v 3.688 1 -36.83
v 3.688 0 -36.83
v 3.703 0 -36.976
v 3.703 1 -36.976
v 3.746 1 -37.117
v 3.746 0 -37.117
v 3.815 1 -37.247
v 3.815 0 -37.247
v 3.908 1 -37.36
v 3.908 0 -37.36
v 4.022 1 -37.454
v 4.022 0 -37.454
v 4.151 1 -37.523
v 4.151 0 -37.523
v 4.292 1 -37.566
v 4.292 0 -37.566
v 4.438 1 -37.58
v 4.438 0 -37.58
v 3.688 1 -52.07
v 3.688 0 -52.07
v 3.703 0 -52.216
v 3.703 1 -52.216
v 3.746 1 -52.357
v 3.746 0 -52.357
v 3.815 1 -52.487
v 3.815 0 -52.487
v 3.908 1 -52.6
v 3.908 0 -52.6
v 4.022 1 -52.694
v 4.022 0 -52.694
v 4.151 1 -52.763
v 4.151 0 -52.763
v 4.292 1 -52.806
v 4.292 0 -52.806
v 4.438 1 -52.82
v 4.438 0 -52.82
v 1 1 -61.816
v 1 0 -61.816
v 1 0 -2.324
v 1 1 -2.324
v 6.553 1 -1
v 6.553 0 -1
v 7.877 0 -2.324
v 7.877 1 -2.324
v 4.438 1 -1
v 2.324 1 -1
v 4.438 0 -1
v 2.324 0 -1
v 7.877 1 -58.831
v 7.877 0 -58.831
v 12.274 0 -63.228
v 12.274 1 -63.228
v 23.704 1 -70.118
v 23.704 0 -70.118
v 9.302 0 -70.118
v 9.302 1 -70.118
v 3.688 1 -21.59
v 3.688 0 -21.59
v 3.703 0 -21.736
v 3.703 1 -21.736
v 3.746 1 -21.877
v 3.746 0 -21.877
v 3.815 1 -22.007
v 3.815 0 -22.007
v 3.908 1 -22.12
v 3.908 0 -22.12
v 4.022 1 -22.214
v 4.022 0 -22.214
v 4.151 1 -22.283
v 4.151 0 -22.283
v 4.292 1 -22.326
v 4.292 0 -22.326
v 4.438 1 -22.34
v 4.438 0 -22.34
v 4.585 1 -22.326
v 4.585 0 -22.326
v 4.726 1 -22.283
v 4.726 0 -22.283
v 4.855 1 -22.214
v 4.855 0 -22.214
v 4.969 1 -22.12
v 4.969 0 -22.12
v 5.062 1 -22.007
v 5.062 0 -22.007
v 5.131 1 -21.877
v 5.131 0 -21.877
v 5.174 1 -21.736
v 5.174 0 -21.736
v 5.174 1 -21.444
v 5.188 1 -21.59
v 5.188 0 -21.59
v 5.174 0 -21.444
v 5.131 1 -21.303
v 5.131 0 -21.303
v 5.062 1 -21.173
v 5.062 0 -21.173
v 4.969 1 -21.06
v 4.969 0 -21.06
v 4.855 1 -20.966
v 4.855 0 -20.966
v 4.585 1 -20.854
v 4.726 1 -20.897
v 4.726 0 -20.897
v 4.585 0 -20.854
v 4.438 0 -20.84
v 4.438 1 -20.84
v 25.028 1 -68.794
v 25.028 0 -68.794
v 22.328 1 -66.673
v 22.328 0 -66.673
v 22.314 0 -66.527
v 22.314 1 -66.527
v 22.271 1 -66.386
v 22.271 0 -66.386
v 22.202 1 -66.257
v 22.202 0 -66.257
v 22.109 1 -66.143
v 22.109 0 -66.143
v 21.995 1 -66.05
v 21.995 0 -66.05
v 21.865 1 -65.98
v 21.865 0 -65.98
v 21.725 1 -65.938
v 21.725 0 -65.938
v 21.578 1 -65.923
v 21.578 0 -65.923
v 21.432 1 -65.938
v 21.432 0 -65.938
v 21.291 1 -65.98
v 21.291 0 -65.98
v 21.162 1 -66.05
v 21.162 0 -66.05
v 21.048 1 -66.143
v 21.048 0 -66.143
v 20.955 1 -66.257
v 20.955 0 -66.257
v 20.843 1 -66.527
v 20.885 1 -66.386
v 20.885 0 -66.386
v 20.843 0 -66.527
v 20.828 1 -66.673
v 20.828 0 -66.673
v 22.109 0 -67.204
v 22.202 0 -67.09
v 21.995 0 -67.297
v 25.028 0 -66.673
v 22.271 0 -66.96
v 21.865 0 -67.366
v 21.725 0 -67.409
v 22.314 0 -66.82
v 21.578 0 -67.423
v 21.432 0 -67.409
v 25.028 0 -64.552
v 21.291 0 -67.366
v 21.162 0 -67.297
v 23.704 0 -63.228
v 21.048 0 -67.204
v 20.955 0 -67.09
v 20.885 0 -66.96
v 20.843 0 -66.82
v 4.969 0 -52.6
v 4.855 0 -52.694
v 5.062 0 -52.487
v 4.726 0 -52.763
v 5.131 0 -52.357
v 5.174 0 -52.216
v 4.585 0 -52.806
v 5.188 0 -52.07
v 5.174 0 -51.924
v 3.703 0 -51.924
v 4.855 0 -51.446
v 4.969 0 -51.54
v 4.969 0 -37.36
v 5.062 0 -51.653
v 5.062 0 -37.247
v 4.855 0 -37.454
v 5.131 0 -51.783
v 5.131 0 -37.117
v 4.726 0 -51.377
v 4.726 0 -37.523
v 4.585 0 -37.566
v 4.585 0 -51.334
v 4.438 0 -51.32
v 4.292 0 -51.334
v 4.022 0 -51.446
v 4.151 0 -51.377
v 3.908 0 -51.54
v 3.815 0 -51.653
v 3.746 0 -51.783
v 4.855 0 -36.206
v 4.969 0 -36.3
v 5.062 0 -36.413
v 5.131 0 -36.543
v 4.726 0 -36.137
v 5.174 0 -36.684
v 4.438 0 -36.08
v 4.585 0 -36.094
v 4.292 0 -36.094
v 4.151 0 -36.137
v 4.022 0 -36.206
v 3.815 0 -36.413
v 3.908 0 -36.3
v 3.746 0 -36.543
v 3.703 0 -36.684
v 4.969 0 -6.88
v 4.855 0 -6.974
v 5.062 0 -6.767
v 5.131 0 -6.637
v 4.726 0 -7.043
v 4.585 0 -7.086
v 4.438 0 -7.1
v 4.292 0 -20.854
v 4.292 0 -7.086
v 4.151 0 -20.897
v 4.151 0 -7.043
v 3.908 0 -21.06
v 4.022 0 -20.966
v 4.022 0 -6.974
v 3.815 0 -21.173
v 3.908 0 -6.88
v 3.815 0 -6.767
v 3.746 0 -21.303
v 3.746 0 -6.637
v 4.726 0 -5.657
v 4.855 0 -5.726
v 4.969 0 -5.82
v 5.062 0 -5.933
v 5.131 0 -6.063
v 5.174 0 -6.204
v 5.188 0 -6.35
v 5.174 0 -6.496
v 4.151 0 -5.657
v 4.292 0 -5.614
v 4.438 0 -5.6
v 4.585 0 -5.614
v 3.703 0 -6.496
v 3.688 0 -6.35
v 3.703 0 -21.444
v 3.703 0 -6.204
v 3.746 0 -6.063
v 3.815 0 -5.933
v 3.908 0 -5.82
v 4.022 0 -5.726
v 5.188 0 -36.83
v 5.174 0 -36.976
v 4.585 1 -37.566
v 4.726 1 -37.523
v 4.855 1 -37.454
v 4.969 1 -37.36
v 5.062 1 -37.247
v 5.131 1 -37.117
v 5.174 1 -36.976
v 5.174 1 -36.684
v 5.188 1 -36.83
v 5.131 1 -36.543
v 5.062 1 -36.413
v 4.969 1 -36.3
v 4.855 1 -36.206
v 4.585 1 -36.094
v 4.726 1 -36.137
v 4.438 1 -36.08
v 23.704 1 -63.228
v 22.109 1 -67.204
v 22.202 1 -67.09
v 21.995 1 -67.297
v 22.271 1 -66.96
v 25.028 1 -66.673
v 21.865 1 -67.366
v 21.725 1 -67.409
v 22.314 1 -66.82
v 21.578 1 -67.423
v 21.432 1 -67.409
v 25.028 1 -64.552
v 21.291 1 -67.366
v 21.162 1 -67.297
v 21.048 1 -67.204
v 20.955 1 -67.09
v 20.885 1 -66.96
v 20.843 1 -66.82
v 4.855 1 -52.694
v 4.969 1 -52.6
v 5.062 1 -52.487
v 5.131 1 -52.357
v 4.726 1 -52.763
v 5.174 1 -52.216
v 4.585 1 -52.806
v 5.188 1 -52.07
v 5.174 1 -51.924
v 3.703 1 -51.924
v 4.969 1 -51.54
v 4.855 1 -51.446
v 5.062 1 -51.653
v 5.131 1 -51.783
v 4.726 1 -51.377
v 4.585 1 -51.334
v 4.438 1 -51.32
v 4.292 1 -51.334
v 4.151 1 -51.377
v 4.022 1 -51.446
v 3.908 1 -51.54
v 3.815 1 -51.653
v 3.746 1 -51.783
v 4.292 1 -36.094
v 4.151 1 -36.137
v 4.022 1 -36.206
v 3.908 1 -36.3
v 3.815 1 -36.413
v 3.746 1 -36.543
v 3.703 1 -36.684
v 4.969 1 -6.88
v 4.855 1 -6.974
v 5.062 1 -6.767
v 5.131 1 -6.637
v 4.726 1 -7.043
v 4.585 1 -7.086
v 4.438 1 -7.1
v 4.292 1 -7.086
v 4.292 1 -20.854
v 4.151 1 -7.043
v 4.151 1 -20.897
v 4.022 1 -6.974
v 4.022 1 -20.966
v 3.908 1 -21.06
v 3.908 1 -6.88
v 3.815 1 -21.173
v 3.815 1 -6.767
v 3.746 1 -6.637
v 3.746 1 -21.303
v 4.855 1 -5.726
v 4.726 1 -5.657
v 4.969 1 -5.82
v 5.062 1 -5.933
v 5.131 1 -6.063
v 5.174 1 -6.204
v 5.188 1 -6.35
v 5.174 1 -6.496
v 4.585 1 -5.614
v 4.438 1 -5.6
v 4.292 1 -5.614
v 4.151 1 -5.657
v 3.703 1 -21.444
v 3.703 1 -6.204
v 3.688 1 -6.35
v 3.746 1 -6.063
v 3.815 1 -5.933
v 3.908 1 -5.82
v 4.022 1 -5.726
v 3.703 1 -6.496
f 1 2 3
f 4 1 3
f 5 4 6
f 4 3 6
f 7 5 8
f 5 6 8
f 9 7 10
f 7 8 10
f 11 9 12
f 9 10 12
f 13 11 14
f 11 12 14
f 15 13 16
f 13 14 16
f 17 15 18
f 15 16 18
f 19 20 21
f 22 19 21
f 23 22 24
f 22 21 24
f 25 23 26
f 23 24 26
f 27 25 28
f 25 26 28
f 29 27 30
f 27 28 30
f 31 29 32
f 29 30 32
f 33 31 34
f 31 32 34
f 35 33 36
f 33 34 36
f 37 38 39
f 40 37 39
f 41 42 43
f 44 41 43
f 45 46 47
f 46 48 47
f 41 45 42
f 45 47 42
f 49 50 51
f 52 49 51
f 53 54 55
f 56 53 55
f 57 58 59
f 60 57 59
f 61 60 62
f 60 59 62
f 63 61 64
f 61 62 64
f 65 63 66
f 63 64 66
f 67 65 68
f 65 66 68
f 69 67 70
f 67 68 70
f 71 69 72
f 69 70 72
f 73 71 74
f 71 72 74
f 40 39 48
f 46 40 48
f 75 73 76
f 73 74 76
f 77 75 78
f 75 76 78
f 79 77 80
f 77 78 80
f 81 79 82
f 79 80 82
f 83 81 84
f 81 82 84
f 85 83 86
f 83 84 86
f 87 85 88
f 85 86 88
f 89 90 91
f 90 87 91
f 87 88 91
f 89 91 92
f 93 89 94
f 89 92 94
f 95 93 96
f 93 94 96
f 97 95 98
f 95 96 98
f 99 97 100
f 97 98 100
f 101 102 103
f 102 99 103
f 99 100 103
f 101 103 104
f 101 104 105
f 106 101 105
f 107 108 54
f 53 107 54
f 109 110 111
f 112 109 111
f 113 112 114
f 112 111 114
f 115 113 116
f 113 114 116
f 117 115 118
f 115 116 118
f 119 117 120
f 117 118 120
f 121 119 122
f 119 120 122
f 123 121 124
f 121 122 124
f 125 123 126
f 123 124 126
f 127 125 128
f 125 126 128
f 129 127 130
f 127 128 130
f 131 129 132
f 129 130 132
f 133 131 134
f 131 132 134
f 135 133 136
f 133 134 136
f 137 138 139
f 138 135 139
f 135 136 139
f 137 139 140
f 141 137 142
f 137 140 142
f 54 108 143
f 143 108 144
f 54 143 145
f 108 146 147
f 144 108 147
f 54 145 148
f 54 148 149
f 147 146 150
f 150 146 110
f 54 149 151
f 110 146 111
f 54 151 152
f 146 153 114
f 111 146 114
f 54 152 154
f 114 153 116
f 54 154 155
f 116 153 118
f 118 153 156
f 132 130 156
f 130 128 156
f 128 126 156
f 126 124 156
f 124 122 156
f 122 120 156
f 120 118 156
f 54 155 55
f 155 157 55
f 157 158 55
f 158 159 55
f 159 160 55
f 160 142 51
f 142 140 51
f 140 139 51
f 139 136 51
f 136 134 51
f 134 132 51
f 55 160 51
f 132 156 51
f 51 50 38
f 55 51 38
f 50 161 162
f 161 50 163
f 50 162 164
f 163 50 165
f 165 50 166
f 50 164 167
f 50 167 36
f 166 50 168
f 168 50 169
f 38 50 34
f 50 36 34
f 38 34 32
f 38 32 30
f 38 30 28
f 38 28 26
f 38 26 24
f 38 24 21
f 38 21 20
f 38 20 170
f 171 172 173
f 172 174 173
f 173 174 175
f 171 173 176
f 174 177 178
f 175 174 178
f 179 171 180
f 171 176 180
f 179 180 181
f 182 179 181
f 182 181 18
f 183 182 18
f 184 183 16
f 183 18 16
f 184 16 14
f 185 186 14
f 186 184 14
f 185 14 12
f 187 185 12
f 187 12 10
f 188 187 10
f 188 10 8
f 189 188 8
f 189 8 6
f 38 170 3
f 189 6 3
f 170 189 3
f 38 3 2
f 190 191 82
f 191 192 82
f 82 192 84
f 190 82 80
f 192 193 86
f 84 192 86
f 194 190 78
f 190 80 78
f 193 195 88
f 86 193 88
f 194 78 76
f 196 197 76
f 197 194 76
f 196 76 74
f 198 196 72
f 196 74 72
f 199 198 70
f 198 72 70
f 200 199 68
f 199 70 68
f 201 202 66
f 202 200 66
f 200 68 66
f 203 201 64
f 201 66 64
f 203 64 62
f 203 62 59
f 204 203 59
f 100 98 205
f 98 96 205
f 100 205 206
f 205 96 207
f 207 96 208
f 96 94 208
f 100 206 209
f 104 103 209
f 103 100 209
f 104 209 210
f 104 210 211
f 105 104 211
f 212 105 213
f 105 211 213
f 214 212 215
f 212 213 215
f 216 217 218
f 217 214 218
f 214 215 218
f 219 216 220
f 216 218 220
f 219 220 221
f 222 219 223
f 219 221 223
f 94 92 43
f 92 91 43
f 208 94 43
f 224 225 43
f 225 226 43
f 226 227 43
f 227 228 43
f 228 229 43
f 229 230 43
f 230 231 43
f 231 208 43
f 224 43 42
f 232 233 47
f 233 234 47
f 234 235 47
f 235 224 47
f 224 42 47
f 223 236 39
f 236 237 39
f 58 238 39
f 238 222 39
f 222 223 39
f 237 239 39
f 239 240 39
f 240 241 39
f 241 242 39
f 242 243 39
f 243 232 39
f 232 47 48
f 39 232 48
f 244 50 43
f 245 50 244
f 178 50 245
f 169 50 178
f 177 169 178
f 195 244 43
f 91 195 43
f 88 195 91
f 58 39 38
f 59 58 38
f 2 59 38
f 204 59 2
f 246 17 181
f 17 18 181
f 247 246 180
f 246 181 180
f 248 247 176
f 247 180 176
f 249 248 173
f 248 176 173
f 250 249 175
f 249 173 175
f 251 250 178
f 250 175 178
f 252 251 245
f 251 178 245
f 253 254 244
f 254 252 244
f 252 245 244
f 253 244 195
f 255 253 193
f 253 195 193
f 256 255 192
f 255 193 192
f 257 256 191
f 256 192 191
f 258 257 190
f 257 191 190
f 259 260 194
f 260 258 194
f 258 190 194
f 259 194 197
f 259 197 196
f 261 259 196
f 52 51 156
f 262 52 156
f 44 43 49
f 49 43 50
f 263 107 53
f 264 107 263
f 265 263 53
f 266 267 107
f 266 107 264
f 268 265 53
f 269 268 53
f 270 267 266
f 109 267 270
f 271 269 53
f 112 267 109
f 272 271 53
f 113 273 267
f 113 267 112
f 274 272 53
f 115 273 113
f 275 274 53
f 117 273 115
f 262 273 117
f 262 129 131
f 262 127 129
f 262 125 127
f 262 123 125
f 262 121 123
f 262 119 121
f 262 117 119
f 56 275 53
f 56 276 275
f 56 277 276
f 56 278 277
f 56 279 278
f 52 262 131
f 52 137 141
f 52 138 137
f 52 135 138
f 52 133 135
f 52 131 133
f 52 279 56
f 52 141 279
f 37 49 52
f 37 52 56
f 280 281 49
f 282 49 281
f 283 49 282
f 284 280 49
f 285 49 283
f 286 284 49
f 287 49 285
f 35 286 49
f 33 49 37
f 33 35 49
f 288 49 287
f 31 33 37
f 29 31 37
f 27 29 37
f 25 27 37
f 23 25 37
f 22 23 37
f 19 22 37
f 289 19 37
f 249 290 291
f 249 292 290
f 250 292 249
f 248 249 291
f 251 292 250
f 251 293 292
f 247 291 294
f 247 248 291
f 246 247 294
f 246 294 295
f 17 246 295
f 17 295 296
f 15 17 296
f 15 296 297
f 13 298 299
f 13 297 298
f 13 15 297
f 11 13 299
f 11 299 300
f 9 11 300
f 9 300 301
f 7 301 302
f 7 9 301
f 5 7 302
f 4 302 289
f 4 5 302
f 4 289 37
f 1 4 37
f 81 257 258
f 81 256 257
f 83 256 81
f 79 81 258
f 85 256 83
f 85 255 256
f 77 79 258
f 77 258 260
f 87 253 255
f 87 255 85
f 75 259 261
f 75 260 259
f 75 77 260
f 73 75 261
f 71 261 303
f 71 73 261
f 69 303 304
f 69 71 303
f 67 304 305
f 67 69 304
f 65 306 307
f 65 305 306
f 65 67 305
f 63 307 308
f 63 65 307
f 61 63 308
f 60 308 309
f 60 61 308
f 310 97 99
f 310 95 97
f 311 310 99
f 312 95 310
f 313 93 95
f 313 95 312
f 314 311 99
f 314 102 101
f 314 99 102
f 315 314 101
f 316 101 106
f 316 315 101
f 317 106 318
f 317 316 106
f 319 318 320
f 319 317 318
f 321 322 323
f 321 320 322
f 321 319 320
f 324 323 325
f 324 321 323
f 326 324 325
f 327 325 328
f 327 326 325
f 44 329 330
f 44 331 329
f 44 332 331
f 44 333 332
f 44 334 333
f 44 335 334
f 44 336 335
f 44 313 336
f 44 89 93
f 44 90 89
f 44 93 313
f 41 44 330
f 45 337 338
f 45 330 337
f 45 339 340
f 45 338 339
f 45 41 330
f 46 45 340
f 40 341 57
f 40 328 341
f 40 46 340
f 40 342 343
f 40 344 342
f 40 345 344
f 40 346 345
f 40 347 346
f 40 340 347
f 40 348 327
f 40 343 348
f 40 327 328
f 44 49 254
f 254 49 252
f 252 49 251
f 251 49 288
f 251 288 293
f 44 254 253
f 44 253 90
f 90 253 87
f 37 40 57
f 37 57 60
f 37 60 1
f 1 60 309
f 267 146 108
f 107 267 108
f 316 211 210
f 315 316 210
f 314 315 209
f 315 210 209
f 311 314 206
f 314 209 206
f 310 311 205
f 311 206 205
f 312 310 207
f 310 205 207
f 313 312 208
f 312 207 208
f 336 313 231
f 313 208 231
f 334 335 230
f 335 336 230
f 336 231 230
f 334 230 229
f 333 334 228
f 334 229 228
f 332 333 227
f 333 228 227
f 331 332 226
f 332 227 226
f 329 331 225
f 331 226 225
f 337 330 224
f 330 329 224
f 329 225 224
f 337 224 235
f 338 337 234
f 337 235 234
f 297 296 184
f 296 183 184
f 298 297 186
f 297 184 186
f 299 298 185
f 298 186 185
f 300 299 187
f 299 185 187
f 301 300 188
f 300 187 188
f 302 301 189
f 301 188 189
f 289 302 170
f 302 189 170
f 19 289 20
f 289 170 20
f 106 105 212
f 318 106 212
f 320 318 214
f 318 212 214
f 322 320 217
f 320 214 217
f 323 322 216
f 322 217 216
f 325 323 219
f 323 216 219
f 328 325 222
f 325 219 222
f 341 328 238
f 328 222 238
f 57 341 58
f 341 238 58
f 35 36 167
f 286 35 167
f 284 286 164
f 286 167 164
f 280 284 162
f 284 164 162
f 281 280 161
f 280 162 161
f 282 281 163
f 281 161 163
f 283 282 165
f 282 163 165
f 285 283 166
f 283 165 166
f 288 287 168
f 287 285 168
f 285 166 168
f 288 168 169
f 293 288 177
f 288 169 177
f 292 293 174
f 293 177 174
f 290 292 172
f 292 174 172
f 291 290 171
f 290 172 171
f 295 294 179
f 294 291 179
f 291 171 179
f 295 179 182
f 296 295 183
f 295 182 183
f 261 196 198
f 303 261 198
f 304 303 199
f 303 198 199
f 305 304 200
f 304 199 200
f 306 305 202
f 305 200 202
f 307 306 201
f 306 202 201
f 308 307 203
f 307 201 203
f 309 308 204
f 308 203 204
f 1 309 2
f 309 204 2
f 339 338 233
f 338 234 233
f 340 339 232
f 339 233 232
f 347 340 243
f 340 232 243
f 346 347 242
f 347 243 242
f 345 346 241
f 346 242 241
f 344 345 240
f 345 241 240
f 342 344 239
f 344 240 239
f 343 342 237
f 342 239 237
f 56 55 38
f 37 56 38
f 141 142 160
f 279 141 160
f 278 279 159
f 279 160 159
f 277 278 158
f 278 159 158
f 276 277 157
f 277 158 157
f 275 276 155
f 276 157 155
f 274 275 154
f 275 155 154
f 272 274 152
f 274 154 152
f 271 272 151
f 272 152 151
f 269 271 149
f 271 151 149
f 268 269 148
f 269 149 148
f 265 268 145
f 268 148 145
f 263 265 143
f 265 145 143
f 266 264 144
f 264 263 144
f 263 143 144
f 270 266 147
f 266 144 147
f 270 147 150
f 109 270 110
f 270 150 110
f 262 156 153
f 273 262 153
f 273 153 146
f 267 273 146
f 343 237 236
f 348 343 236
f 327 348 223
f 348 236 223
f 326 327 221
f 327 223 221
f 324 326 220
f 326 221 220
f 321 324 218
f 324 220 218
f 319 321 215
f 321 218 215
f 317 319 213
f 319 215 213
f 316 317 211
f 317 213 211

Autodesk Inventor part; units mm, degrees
ref_plane "YZ Plane" through (0, 0, 0) normal (1, 0, 0) x (0, 1, 0)
ref_plane "XZ Plane" through (0, 0, 0) normal (0, 1, 0) x (-1, 0, 0)
ref_plane "XY Plane" through (0, 0, 0) normal (0, 0, 1) x (1, 0, 0)
sketch "Szkic1" plane through (0, 0, 0) normal (0, 1, 0) x (-1, 0, 0)
  line L0 (0, -1.91) -> (0, -62.23)
  line L1 (0, -62.23) -> (-8.8883, -71.1183)
  line L2 (0, -62.23) -> (12.57, -62.23) construction
  line L3 (-8.8883, -71.1183) -> (-24.1183, -71.1183)
  line L4 (-26.0283, -69.2083) -> (-26.0283, -64.1383)
  line L5 (-24.1183, -62.2283) -> (-12.6883, -62.2283)
  line L6 (-12.6883, -62.2283) -> (-8.877, -58.417)
  line L7 (-12.6883, -62.2283) -> (-7.2983, -62.2283) construction
  line L8 (-8.877, -58.417) -> (-8.877, -1.91)
  line L9 (-6.967, 0) -> (-1.91, 0)
  line L10 (-1.91, 0) -> (0, -1.91)
  line L11 (-8.877, -1.91) -> (-6.967, 0)
  line L12 (-26.0283, -64.1383) -> (-24.1183, -62.2283)
  line L13 (-26.0283, -69.2083) -> (-24.1183, -71.1183)
  line L14 (-26.0283, -66.6733) -> (-15.6934, -66.6733)
  circle A0 centre (-21.5783, -66.6733) radius 0.75
  line L15 (-4.4385, 0) -> (-4.4385, -63.1833)
  circle A1 centre (-4.4385, -6.35) radius 0.75
  circle A2 centre (-4.4385, -21.59) radius 0.75
  circle A3 centre (-4.4385, -36.83) radius 0.75
  circle A4 centre (-4.4385, -52.07) radius 0.75
  line L16 (-1, -61.8158) -> (-1, -2.3242)
  line L17 (-1, -2.3242) -> (-2.3242, -1)
  line L18 (-2.3242, -1) -> (-6.5528, -1)
  line L19 (-6.5528, -1) -> (-7.877, -2.3242)
  line L20 (-7.877, -2.3242) -> (-7.877, -58.8312)
  line L21 (-7.877, -58.8312) -> (-12.2741, -63.2283)
  line L22 (-12.2741, -63.2283) -> (-23.7041, -63.2283)
  line L23 (-23.7041, -63.2283) -> (-25.0283, -64.5525)
  line L24 (-25.0283, -64.5525) -> (-25.0283, -68.7941)
  line L25 (-25.0283, -68.7941) -> (-23.7041, -70.1183)
  line L26 (-23.7041, -70.1183) -> (-9.3025, -70.1183)
  line L27 (-9.3025, -70.1183) -> (-1, -61.8158)
  point P0 (0, 0)
  point P1 (-26.0283, -71.1183)
  point P2 (-26.0283, -62.2283)
  point P3 (-8.877, 0)
  dimension "d0" = 62.23
  dimension "d1" = 135
  dimension "d2" = 12.57
  dimension "d3" = 17.14
  dimension "d4" = 8.89
  dimension "d5" = 13.34
  dimension "d6" = 45
  dimension "d7" = 5.39
  dimension "d8" = 1.91
  dimension "d9" = 1.91
  dimension "d10" = 1.91
  dimension "d11" = 1.91
  dimension "d12" = 1.91
  dimension "d13" = 1.91
  dimension "d14" = 1.91
  dimension "d15" = 1.91
  dimension "d16" = 1.5
  dimension "d17" = 4.45
  dimension "d18" = 1.5
  dimension "d19" = 6.35
  dimension "d22" = 15.24
  dimension "d27" = 19.048
  dimension "d28" = 1
  dimension "d31" = 45.72
extrude "Wyciągnięcie proste1" add sketch "Szkic1" along normal blind 1 contours L18 L17 L16 L27 L26 L25 L24 L23 L22 L21 L20 L19
equation "\"d9\" = d8"
equation "\"d10\" = d8"
equation "\"d11\" = d10"
equation "\"d12\" = d8"
equation "\"d13\" = d12"
equation "\"d14\" = d8"
equation "\"d15\" = d14"
properties part number "gnd"
